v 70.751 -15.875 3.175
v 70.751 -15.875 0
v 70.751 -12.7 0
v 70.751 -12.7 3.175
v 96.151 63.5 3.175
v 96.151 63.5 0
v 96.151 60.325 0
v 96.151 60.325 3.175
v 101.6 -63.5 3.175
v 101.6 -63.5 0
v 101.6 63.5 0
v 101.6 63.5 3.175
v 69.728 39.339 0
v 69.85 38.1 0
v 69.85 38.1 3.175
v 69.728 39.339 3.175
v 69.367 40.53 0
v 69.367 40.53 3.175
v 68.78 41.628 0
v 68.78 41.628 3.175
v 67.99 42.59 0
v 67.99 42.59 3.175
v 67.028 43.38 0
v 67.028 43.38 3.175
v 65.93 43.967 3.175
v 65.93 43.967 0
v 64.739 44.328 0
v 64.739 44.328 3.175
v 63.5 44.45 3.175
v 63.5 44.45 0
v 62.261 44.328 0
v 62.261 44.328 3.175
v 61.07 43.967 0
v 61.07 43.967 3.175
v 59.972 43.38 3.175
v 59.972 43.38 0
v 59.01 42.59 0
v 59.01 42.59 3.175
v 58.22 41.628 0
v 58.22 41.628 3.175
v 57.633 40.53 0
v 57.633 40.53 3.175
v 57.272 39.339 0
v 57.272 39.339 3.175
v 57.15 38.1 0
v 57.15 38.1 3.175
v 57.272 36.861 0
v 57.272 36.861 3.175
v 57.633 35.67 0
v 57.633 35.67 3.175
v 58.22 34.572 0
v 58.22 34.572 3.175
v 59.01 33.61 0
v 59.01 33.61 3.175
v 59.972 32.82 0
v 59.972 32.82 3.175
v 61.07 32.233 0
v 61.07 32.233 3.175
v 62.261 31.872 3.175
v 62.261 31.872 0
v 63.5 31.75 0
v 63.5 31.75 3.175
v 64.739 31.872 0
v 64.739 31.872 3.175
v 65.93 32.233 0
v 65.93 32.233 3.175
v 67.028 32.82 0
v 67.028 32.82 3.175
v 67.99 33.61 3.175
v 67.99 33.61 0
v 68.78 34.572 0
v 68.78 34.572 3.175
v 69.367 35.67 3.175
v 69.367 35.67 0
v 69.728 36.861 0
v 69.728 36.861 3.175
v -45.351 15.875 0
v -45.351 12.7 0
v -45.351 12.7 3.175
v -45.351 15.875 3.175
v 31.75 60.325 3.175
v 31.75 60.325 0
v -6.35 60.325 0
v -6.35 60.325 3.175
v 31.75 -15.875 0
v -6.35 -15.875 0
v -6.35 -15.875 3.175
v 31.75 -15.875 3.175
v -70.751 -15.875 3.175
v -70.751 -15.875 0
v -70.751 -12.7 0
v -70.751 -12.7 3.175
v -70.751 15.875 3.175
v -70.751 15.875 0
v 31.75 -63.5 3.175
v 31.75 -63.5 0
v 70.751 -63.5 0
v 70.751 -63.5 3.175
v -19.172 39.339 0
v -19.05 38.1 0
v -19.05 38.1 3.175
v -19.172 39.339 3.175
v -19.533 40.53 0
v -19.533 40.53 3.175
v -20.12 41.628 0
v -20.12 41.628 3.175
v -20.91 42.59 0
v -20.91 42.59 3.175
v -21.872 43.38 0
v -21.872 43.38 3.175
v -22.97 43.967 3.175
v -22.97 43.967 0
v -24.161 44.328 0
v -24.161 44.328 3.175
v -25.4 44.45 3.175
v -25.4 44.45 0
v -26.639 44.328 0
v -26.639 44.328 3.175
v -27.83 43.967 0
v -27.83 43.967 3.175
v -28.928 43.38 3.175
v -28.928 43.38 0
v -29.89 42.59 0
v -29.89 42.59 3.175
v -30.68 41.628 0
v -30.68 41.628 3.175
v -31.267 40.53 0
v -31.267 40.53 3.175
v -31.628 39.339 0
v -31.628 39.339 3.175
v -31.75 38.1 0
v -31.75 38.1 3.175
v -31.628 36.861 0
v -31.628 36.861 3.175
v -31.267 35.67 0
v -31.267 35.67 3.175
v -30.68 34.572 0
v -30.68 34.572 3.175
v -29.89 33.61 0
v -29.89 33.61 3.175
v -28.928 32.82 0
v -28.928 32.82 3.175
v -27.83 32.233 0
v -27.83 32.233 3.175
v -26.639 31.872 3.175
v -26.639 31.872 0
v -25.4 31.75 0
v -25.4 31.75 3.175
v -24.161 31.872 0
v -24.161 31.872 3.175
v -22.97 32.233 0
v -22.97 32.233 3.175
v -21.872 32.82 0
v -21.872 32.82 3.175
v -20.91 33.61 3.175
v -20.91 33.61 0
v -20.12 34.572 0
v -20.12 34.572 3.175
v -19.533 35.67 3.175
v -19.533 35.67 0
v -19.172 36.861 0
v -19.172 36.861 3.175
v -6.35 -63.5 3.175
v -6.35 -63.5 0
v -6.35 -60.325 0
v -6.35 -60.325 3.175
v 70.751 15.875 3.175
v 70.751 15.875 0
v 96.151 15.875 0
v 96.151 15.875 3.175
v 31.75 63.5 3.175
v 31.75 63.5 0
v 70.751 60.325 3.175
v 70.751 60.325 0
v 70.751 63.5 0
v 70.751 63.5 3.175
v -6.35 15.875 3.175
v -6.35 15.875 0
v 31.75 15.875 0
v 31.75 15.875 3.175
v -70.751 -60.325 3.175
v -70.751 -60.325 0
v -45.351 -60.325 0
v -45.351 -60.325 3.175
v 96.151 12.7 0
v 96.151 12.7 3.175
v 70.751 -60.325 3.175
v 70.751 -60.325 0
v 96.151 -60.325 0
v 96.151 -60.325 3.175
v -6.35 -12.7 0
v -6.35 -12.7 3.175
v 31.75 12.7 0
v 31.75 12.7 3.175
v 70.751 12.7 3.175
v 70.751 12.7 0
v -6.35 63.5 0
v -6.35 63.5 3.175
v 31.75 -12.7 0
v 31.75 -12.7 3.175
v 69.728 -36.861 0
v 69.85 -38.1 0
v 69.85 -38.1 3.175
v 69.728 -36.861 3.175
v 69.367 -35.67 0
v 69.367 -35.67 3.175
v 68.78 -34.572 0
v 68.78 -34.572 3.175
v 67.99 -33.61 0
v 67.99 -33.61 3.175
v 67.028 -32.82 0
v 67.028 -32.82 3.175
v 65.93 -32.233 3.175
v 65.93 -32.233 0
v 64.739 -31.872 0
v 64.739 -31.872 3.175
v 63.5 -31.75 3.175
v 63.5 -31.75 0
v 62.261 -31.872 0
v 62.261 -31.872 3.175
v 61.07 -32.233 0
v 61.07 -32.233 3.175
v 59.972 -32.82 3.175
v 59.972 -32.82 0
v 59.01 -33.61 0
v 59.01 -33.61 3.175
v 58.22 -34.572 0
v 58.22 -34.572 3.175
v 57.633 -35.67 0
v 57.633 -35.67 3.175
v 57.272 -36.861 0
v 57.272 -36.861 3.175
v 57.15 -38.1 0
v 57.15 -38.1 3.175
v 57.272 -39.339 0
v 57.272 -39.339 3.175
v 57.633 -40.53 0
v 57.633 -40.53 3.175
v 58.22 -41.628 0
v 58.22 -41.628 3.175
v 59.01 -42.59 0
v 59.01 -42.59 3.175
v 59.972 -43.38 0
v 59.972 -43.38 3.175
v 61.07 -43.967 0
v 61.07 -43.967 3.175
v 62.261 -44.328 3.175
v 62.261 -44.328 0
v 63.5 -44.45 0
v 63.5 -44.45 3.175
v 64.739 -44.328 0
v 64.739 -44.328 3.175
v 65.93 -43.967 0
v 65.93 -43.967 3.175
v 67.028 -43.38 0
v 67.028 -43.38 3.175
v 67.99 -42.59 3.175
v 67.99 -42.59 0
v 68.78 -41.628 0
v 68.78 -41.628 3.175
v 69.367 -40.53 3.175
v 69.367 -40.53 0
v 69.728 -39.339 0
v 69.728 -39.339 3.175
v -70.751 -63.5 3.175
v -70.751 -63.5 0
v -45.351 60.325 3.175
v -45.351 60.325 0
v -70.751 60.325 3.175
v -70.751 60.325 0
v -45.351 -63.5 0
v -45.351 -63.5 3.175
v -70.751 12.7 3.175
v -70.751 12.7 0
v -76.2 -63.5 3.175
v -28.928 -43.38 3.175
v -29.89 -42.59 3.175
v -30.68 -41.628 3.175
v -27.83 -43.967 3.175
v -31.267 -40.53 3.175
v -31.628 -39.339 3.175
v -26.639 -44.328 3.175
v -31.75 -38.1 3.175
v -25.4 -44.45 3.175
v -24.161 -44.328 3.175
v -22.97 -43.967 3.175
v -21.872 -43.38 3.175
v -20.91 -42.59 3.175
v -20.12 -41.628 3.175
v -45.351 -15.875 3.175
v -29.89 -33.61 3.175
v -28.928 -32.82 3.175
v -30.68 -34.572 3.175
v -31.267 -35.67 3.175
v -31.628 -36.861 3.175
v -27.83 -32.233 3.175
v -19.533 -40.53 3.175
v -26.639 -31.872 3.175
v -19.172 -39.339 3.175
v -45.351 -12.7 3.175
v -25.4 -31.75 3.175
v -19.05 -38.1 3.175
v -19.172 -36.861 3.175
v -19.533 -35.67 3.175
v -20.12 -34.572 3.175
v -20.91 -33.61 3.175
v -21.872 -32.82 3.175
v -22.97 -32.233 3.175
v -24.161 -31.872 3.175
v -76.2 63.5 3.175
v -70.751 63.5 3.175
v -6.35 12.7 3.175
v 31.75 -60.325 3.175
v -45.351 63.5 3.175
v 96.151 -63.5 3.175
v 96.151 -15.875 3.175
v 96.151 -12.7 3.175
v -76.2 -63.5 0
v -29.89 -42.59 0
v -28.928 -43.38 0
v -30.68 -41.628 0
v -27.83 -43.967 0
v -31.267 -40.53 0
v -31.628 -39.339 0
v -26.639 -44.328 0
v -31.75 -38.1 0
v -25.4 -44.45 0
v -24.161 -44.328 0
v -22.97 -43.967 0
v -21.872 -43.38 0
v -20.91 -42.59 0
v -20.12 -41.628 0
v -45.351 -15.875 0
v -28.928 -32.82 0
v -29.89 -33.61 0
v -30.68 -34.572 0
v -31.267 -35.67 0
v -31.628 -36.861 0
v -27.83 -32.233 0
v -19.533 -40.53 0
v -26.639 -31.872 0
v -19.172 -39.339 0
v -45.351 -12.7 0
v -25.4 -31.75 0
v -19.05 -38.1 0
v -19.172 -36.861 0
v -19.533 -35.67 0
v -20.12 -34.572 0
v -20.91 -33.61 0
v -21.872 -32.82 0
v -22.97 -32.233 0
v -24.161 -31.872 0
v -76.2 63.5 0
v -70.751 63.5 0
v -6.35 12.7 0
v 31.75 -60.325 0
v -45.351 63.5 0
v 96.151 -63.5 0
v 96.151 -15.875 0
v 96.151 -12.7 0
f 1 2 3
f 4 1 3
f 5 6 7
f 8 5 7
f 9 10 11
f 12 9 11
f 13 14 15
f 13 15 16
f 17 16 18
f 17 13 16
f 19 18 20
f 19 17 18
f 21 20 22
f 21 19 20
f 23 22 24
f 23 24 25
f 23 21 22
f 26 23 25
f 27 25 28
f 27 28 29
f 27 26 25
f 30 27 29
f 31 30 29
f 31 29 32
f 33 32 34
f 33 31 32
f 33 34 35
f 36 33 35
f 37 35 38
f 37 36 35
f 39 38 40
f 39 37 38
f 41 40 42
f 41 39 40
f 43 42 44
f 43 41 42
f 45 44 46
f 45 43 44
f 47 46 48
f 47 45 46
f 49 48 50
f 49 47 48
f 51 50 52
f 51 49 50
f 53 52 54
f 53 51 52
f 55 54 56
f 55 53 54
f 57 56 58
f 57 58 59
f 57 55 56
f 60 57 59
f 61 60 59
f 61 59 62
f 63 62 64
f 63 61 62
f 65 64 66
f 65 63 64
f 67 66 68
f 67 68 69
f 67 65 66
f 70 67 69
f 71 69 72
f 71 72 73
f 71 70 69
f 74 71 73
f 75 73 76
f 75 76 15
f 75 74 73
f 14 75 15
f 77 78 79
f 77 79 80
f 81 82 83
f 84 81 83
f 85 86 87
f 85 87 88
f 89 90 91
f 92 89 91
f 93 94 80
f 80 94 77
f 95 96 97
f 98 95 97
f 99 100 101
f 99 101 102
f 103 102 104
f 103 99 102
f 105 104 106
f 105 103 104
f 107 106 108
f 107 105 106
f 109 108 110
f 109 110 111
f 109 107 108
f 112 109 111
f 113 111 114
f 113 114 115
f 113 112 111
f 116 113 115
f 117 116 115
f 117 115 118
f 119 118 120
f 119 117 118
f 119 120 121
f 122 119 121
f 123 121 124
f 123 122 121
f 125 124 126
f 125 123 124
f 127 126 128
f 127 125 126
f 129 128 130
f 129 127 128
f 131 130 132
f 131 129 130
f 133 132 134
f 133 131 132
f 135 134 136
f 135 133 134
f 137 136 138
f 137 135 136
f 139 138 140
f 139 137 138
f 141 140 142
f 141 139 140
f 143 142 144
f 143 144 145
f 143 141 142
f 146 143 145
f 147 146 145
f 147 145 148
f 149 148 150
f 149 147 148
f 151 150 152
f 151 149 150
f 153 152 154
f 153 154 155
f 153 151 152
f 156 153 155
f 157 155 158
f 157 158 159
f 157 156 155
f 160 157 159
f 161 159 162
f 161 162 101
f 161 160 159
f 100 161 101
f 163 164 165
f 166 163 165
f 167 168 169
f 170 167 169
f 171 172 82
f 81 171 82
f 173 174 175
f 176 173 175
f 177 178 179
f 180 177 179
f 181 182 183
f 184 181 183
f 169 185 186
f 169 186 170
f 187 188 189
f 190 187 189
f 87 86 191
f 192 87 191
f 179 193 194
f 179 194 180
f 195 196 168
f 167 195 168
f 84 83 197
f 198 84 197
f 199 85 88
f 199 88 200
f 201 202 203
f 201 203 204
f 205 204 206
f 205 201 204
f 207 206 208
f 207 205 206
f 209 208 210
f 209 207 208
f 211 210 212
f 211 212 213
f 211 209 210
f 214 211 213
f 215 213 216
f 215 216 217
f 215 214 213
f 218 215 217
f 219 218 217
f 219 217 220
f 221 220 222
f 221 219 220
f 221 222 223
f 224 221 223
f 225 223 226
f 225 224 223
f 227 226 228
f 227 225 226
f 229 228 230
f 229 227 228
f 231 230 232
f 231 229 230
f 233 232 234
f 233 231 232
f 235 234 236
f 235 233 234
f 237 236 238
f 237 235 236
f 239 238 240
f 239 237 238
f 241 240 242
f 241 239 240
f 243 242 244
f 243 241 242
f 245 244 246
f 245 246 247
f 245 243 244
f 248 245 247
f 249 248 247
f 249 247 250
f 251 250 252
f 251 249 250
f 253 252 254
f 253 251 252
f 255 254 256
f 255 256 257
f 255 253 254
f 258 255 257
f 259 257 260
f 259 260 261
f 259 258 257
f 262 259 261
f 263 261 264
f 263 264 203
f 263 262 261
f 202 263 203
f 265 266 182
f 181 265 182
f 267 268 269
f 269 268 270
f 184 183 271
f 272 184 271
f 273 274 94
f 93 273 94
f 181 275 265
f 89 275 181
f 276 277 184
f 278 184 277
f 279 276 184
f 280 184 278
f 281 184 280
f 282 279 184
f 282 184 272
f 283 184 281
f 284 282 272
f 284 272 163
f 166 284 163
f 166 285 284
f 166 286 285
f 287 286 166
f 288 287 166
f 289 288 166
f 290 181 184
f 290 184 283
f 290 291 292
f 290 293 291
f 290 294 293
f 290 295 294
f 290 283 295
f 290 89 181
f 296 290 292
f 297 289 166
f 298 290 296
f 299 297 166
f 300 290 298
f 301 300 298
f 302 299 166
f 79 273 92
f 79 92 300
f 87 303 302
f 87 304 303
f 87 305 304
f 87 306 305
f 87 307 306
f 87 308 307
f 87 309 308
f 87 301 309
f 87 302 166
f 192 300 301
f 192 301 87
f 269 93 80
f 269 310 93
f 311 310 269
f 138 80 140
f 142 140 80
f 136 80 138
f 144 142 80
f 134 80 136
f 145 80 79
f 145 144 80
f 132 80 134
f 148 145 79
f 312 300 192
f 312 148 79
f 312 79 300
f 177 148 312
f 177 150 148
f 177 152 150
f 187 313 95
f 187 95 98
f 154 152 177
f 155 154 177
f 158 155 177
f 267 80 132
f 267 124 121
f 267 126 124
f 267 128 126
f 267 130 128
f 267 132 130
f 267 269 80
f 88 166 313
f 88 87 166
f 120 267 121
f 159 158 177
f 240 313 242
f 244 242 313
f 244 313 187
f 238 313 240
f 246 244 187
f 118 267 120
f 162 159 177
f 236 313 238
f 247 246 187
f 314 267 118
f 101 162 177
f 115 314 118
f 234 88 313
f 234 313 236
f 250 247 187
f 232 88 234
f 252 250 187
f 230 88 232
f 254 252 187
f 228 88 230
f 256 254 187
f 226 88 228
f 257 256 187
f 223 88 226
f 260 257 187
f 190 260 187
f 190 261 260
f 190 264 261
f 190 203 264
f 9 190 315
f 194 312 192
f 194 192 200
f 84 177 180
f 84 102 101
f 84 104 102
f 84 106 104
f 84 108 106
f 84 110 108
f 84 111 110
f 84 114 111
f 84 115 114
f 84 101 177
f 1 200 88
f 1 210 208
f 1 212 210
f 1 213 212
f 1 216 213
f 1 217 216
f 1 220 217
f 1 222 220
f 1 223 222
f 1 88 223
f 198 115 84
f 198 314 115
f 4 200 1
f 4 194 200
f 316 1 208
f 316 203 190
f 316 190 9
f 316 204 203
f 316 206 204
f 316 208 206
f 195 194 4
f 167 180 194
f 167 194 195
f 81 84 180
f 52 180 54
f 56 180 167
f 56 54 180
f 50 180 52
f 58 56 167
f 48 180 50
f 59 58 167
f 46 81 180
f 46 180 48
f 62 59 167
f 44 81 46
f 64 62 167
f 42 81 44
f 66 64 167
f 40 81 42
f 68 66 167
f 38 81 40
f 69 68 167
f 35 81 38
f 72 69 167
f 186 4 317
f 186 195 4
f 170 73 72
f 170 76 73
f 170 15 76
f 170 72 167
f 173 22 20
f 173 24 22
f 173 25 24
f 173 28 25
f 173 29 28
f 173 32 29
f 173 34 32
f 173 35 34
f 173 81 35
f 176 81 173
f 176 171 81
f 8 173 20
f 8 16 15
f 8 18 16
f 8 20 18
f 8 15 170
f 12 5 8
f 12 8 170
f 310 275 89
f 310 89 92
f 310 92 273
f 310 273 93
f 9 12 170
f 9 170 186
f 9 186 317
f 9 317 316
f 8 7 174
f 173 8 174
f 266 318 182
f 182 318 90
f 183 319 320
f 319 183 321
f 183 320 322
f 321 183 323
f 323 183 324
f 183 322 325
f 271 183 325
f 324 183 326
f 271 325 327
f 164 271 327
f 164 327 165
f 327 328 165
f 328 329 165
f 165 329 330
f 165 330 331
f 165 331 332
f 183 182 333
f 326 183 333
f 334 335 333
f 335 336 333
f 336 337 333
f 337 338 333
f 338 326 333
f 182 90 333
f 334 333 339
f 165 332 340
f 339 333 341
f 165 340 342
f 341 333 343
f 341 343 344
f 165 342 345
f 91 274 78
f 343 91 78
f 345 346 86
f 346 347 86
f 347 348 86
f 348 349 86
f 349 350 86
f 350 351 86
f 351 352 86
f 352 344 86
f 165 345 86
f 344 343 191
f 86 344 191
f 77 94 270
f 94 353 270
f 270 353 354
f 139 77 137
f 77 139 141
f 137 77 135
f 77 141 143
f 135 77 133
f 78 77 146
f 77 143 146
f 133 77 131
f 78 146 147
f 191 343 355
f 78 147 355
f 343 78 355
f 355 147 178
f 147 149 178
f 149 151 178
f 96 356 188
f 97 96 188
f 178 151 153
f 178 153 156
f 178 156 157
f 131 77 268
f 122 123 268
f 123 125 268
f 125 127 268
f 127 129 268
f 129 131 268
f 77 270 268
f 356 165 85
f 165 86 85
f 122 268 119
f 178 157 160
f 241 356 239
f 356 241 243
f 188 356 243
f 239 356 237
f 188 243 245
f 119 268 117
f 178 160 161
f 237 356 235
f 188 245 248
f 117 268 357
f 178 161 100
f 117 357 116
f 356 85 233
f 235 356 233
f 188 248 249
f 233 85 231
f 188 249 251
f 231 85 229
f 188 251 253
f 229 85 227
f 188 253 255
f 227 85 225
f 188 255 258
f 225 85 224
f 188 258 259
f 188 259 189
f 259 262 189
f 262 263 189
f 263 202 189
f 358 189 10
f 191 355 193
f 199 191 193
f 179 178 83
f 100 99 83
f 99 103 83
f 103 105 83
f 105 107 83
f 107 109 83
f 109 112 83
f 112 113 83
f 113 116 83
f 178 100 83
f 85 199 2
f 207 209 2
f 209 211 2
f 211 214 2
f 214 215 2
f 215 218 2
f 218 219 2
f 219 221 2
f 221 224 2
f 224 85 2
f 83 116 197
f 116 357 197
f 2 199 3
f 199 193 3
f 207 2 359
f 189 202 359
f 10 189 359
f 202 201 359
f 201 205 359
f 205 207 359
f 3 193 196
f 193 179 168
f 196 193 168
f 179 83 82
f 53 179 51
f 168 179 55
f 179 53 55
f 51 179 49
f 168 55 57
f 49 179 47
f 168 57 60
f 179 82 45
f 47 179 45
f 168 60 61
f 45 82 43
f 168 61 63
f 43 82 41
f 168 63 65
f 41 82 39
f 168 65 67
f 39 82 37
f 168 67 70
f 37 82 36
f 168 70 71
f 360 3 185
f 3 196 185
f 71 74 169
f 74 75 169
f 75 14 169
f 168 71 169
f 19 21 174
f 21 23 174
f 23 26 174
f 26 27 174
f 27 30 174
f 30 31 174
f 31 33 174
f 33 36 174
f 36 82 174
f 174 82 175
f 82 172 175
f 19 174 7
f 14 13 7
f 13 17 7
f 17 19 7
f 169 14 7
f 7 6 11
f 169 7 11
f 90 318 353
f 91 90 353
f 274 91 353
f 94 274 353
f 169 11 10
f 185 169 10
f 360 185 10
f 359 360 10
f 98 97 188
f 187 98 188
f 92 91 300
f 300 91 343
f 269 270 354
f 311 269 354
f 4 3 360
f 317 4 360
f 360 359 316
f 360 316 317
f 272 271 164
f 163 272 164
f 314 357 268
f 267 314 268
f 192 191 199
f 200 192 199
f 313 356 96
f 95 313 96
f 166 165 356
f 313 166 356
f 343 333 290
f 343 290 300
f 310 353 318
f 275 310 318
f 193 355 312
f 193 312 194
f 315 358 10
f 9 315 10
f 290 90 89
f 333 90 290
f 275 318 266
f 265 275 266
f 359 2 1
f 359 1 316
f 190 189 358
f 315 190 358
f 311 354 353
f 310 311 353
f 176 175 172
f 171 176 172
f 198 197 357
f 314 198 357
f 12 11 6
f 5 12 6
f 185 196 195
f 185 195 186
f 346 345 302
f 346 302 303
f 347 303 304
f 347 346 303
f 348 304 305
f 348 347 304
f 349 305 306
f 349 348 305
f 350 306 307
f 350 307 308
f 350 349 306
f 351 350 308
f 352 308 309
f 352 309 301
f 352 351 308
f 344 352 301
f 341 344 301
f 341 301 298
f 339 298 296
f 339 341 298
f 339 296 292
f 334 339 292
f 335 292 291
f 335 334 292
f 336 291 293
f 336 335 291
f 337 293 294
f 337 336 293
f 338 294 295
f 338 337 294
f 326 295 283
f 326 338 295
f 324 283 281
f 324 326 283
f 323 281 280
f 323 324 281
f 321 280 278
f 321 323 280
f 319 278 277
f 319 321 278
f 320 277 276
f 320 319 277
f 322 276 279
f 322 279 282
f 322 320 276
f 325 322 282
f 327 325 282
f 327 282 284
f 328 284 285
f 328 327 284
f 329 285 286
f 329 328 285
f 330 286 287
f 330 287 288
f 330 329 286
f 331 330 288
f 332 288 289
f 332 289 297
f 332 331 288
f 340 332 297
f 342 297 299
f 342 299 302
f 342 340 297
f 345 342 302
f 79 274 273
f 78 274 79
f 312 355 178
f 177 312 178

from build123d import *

# Parameters (mm, degrees)
F0_R     = 6.35
F0_W     = 25.4
F0_H     = 3.175
F0_W_2   = 38.1
F1_DEPTH = 3.175


# Not quite as in the source:
# - a feature names something its author has since deleted; it is built from what else it names


with BuildPart() as f1:
    # F0 (on Top) → F1 (new body)
    with BuildSketch(Plane.XY):
        Polygon((-70.7512, 63.5), (-76.2, 63.5), (-76.2, -63.5), (-70.7512, -63.5), (-70.7512, -60.325), (-45.3512, -60.325), (-45.3512, -63.5), (-6.35, -63.5), (-6.35, -60.325), (31.75, -60.325), (31.75, -63.5), (70.7512, -63.5), (70.7512, -60.325), (96.1512, -60.325), (96.1512, -63.5), (101.6, -63.5), (101.6, 63.5), (96.1512, 63.5), (96.1512, 60.325), (70.7512, 60.325), (70.7512, 63.5), (31.75, 63.5), (31.75, 60.325), (-6.35, 60.325), (-6.35, 63.5), (-45.3512, 63.5), (-45.3512, 60.325), (-70.7512, 60.325), align=None)
        with Locations((-25.4, -38.1)):
            Circle(F0_R, mode=Mode.SUBTRACT)
        with Locations((-58.0512, -14.2875)):
            Rectangle(F0_W, F0_H, mode=Mode.SUBTRACT)
        with Locations((63.5, -38.1)):
            Circle(F0_R, mode=Mode.SUBTRACT)
        with Locations((12.7, -14.2875)):
            Rectangle(F0_W_2, F0_H, mode=Mode.SUBTRACT)
        with Locations((83.4512, -14.2875)):
            Rectangle(F0_W, F0_H, mode=Mode.SUBTRACT)
        with Locations((-58.0512, 14.2875)):
            Rectangle(F0_W, F0_H, mode=Mode.SUBTRACT)
        with Locations((-25.4, 38.1)):
            Circle(F0_R, mode=Mode.SUBTRACT)
        with Locations((12.7, 14.2875)):
            Rectangle(F0_W_2, F0_H, mode=Mode.SUBTRACT)
        with Locations((83.4512, 14.2875)):
            Rectangle(F0_W, F0_H, mode=Mode.SUBTRACT)
        with Locations((63.5, 38.1)):
            Circle(F0_R, mode=Mode.SUBTRACT)
    extrude(amount=F1_DEPTH)


solid = f1.part
